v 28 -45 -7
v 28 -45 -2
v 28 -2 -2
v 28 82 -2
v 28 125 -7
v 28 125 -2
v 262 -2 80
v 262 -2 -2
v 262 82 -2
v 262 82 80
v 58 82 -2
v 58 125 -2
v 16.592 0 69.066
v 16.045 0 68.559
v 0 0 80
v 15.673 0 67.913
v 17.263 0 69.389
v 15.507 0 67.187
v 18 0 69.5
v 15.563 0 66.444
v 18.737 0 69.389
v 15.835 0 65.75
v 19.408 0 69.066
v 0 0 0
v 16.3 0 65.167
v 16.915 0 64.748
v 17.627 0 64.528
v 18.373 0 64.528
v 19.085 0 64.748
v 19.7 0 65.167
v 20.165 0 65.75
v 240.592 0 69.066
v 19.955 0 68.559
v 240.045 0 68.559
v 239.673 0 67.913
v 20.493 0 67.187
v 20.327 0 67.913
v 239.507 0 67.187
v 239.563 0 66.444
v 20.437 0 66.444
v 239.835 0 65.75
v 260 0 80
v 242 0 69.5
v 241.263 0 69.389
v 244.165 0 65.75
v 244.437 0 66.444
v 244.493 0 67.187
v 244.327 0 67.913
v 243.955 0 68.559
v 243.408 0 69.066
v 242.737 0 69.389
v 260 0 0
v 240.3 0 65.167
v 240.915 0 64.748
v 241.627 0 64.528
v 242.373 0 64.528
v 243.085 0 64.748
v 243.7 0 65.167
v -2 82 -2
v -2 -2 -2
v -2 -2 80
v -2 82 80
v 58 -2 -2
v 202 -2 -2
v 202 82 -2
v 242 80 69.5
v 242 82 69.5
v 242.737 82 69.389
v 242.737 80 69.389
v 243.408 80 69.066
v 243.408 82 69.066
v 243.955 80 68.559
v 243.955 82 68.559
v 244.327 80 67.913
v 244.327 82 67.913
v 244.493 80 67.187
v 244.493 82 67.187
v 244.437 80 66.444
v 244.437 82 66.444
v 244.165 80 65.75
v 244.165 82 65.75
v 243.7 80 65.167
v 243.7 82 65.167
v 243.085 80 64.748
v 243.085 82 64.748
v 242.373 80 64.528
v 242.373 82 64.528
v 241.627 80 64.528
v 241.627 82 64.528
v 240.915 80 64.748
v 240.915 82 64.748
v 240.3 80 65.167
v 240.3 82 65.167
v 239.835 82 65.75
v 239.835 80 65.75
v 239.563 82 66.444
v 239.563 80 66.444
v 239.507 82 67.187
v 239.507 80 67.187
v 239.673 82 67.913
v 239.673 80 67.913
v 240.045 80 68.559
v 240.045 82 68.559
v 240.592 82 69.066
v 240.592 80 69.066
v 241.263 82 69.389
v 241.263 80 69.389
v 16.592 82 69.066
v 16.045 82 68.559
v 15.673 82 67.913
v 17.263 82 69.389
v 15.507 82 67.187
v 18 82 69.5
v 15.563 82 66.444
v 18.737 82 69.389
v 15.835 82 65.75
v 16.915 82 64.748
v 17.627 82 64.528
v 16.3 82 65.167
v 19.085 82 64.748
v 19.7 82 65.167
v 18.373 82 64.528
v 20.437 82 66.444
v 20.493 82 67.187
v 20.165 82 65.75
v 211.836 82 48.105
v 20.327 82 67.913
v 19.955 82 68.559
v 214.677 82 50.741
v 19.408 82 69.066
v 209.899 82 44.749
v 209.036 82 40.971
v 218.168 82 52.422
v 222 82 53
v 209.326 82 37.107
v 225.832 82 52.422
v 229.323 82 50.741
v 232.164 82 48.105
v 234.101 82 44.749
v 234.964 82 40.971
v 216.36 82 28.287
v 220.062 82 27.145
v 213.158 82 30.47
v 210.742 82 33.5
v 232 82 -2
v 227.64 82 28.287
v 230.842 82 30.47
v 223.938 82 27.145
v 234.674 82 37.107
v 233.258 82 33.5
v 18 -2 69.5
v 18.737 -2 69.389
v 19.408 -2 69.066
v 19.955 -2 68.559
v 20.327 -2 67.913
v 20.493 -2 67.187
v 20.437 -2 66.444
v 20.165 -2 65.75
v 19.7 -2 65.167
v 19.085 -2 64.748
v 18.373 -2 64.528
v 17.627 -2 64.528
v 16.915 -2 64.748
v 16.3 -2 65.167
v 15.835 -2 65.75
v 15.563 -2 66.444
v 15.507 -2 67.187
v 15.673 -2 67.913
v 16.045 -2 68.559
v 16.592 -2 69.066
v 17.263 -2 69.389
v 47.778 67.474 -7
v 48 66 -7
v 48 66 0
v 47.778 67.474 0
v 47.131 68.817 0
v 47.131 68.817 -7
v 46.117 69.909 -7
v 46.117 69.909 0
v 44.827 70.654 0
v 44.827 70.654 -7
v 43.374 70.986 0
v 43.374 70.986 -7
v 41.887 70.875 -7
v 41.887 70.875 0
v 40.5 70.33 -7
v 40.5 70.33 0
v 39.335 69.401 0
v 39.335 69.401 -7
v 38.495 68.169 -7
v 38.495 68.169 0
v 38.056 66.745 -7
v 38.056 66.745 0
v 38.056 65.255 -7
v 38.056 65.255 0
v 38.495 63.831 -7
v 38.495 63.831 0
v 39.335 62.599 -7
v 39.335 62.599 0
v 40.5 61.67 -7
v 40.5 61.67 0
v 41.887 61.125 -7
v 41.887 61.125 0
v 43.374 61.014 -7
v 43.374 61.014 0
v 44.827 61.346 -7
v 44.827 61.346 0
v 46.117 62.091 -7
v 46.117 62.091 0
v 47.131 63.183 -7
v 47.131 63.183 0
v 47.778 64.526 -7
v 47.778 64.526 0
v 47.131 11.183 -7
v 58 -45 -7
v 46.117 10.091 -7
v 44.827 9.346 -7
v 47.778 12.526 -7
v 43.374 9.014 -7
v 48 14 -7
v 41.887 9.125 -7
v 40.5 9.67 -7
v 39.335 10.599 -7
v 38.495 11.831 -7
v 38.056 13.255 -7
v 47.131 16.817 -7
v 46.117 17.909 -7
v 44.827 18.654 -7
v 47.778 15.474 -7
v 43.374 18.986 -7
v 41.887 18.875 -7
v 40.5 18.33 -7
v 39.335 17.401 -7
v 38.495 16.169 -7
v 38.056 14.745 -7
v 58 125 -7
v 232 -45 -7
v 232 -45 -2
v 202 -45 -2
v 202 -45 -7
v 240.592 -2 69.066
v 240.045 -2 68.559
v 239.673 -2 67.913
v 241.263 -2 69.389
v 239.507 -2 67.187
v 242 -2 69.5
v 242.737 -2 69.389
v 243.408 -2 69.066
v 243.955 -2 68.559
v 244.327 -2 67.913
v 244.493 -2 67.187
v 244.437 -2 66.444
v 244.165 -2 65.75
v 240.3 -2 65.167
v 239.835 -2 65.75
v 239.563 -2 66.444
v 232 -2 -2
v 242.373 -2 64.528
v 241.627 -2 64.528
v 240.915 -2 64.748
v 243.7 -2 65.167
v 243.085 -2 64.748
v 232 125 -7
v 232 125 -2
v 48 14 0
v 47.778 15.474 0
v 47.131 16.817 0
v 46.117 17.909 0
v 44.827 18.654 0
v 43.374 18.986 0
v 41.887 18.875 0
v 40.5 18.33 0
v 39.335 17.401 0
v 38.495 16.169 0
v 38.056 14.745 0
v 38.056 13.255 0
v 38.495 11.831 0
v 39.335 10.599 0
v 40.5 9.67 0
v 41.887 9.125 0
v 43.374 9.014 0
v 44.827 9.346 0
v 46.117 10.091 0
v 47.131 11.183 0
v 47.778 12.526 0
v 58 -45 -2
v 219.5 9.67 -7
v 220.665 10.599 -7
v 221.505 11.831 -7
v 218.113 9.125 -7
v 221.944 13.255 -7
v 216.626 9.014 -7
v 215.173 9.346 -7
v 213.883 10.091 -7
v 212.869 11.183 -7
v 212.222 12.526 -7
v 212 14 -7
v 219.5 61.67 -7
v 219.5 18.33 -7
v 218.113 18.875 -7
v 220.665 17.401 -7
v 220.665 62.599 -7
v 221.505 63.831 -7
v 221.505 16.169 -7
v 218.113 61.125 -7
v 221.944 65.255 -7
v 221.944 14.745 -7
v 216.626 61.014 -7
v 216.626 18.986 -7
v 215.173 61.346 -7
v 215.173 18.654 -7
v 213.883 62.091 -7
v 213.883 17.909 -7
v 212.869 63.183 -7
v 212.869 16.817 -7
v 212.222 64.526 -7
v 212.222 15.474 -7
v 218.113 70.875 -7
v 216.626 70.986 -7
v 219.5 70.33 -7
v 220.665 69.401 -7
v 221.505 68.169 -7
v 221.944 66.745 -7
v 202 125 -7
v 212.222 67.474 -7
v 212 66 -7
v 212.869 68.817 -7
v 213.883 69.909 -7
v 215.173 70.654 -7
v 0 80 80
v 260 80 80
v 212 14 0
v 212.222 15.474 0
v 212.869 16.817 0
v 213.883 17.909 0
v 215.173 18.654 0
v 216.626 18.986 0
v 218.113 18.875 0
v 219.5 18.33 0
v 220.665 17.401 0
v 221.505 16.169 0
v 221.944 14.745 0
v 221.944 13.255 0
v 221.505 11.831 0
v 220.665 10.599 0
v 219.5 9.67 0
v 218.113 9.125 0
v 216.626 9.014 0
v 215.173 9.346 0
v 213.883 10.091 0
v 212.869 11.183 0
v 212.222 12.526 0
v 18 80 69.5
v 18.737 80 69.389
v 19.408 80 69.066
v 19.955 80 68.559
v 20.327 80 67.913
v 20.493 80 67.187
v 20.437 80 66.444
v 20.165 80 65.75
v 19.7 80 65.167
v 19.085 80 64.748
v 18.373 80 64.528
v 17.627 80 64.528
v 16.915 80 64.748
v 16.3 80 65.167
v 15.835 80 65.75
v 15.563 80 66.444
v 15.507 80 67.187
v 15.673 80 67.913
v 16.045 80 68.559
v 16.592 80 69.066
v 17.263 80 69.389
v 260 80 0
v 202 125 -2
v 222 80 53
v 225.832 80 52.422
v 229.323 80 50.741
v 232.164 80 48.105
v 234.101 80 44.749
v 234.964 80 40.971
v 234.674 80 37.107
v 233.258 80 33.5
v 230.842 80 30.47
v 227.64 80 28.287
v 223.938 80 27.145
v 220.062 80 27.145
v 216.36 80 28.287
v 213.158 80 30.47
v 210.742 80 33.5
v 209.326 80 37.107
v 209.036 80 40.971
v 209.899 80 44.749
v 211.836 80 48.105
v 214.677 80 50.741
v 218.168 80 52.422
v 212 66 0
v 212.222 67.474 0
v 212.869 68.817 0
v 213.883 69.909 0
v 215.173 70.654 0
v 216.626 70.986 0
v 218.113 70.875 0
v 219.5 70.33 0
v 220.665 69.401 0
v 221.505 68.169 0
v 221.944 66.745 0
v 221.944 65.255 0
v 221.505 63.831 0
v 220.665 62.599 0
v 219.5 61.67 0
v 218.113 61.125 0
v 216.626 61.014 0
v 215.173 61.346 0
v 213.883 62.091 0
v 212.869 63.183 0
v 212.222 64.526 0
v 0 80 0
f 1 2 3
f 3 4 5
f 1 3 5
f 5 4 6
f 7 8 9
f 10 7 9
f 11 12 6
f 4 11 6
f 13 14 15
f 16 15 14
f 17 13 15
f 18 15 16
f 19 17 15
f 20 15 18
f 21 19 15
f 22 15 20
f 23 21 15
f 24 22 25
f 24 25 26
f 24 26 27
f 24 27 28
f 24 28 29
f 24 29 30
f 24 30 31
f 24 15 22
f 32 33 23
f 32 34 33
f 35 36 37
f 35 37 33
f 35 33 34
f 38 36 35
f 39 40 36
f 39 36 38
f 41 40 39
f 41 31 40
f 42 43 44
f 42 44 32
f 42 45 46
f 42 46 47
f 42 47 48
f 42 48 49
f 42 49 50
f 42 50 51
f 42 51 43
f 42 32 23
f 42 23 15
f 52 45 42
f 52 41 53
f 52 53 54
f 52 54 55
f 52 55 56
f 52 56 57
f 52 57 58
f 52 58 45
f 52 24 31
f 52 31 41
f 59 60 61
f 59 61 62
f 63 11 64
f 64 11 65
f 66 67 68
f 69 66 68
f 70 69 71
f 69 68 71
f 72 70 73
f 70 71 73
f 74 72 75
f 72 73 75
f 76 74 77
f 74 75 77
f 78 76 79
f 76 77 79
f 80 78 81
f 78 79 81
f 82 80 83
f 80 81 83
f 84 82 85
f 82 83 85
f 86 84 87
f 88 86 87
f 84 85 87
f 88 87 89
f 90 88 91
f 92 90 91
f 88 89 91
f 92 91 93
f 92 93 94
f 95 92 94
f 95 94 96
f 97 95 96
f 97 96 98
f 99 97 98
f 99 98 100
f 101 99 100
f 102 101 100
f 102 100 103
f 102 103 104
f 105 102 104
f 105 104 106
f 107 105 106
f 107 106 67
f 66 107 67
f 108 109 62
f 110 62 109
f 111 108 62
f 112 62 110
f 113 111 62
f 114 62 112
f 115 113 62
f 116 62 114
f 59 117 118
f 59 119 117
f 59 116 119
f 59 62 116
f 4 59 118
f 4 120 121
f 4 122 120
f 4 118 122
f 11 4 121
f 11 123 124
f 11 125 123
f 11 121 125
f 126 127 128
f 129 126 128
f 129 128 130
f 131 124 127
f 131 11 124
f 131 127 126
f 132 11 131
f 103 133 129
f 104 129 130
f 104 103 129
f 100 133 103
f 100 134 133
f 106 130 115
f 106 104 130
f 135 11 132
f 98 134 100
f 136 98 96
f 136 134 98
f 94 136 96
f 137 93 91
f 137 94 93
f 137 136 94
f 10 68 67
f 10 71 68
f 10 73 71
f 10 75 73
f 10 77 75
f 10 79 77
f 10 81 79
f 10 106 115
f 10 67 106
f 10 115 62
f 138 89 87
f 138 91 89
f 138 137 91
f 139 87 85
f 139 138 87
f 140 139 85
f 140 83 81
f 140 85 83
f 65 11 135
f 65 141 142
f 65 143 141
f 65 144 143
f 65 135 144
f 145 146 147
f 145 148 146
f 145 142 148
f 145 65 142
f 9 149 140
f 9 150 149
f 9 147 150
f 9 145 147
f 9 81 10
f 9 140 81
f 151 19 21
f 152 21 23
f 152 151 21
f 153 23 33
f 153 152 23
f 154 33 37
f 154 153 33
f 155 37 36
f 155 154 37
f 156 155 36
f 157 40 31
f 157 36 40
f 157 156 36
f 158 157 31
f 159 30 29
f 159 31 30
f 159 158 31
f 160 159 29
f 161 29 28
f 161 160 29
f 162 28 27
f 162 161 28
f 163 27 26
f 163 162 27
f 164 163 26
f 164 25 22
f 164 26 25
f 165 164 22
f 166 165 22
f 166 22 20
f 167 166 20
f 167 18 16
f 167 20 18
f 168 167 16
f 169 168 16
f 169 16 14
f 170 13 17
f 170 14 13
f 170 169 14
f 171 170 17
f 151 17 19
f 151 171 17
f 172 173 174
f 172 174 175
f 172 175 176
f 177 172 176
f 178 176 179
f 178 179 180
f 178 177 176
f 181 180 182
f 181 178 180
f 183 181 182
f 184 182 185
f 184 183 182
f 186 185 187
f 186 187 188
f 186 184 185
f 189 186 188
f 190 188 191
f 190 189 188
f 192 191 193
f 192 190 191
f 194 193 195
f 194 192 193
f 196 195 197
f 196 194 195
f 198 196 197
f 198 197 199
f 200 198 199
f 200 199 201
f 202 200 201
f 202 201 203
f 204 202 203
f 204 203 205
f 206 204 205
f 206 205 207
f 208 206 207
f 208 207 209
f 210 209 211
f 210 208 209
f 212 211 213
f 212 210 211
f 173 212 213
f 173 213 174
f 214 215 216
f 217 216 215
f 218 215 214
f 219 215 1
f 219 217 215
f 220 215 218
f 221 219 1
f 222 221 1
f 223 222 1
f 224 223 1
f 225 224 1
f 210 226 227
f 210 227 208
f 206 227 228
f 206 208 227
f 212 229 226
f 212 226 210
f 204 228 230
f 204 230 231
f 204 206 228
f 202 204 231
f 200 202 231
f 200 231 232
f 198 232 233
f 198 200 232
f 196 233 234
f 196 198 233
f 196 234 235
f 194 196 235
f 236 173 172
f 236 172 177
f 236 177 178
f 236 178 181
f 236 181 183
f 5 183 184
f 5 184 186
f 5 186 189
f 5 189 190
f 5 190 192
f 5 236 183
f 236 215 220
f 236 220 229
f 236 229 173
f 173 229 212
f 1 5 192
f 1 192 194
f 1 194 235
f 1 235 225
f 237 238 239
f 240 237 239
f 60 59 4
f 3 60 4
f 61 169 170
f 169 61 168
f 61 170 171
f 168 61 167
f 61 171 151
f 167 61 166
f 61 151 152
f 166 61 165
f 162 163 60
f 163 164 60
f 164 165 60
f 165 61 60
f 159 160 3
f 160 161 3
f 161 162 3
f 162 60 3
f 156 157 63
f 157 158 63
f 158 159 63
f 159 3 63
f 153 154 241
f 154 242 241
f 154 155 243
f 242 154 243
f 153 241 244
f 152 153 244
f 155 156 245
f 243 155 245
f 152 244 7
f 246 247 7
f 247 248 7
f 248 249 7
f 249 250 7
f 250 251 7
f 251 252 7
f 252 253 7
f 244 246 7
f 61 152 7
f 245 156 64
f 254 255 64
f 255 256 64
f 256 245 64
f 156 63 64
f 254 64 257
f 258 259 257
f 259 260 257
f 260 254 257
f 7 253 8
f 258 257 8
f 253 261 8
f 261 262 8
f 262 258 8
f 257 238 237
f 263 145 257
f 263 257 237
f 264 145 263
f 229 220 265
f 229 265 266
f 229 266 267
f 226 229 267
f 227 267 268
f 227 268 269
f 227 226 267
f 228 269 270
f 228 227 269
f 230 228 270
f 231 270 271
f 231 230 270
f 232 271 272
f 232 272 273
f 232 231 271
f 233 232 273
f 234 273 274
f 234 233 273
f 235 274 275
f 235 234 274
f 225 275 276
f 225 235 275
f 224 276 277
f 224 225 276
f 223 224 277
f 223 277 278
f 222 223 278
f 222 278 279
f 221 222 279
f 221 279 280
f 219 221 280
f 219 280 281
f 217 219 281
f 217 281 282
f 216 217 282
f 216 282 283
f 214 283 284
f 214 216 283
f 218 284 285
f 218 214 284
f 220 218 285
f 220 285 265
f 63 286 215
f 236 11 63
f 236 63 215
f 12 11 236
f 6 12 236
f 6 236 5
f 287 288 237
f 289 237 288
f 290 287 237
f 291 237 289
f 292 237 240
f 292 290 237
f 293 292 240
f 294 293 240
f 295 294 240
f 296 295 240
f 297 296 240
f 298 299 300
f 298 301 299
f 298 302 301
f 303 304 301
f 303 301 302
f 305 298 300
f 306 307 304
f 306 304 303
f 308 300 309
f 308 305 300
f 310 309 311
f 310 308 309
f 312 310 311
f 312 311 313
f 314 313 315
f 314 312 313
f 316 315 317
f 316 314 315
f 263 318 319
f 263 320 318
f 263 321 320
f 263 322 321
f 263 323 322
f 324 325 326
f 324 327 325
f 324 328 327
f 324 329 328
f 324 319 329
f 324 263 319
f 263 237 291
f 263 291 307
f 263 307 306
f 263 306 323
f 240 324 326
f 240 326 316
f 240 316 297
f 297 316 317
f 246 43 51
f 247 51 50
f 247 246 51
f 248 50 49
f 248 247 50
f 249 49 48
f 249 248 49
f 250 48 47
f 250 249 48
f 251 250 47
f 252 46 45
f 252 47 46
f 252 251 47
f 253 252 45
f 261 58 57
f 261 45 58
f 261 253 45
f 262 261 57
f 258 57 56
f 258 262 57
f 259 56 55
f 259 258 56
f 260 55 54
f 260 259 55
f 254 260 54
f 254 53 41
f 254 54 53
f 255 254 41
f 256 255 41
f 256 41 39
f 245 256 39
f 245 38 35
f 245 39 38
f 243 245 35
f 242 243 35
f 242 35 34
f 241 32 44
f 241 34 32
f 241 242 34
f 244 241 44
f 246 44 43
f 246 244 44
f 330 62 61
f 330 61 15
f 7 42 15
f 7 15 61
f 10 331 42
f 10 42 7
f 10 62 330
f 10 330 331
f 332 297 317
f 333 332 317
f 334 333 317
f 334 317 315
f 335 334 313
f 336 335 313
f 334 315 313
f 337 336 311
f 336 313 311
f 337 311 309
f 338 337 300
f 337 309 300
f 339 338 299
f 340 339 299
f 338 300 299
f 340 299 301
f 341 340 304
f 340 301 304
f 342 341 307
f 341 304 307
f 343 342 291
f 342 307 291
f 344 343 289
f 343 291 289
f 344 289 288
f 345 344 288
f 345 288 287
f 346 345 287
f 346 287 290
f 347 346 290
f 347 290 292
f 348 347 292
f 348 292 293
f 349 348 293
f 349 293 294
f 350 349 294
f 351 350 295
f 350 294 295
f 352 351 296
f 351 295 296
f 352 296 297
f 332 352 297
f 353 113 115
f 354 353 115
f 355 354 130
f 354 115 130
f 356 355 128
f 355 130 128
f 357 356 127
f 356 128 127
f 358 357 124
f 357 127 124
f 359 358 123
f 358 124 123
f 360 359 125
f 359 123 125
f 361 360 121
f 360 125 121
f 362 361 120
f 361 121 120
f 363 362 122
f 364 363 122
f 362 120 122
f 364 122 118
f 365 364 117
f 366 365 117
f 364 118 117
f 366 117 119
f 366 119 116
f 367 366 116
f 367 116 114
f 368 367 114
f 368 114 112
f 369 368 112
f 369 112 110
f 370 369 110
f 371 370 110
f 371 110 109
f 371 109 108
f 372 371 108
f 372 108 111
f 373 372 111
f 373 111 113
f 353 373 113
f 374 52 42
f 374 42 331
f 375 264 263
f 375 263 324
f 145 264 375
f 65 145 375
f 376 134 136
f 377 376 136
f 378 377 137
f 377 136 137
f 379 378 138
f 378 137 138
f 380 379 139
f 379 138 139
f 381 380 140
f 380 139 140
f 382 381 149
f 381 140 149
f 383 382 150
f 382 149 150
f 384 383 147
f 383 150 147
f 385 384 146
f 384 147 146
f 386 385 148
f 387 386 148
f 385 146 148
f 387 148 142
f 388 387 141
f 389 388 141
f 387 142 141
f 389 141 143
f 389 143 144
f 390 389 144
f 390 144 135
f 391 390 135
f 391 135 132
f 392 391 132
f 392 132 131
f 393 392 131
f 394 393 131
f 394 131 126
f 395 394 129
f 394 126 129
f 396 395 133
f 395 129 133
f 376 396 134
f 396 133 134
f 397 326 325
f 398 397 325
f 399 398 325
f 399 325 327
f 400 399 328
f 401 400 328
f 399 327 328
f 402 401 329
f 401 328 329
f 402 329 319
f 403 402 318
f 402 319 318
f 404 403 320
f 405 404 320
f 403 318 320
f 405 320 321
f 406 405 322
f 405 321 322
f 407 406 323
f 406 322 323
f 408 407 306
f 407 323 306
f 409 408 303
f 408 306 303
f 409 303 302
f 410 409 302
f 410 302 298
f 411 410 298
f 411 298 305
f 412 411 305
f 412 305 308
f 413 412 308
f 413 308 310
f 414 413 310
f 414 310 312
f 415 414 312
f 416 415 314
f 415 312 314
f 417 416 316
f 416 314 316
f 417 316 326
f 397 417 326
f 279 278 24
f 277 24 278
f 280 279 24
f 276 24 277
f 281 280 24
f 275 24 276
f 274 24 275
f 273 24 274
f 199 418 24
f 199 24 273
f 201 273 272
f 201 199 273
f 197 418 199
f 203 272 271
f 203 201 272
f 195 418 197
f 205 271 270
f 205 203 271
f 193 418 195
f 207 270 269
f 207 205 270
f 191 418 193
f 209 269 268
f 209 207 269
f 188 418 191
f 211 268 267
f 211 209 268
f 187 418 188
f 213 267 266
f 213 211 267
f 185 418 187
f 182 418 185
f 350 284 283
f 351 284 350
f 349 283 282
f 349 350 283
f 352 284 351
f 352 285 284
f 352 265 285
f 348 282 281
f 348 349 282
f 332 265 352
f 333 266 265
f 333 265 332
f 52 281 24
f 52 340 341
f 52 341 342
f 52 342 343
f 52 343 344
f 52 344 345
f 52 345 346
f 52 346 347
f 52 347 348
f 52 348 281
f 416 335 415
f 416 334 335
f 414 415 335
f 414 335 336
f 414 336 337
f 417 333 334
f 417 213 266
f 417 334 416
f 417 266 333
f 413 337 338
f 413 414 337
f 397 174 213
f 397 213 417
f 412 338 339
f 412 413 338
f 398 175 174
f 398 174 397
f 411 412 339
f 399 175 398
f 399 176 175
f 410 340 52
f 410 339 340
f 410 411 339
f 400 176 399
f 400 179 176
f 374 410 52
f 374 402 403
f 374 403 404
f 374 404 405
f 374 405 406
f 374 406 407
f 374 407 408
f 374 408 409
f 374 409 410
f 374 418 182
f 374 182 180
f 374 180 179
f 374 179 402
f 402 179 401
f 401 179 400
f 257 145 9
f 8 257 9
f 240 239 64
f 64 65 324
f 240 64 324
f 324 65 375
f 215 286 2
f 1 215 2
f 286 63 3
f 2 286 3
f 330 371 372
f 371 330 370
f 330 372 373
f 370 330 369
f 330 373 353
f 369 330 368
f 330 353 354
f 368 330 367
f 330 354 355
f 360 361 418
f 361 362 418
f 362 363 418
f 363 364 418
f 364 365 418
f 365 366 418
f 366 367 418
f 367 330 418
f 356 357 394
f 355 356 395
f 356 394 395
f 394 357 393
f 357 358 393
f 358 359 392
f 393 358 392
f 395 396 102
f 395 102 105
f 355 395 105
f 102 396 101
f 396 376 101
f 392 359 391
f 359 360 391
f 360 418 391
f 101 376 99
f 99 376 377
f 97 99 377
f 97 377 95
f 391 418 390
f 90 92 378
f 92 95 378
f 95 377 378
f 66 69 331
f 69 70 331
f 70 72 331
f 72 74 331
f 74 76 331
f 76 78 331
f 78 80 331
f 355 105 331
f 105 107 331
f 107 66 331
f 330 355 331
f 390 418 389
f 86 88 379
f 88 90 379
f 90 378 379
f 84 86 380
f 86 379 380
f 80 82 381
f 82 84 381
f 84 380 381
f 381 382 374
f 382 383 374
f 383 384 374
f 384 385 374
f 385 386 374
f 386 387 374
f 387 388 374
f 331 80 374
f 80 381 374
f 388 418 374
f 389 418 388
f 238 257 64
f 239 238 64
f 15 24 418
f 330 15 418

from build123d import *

# Parameters (mm, degrees)
SKETCH1_W           = 260
SKETCH1_H           = 80
BOSS_EXTRUDE1_DEPTH = 80
SHELL1_T            = 2
SKETCH3_W           = 30
SKETCH3_H           = 170
BOSS_EXTRUDE2_DEPTH = 5
SKETCH4_R           = 5
CUT_EXTRUDE3_DEPTH  = 7
SKETCH6_R           = 13
CUT_EXTRUDE4_DEPTH  = 2
SKETCH7_R           = 2.5
CUT_EXTRUDE5_DEPTH  = 82


with BuildPart() as part:
    # Sketch1 → Boss-Extrude1 (new body)
    with BuildSketch(Plane.XY):
        with Locations((130, 40)):
            Rectangle(SKETCH1_W, SKETCH1_H)
    extrude(amount=BOSS_EXTRUDE1_DEPTH)

    # Shell1
    shell1_openings = [part.faces().sort_by_distance(p)[0] for p in [
        (130, 40, 80),
    ]]
    offset(amount=SHELL1_T, openings=shell1_openings, kind=Kind.INTERSECTION)

    # Sketch3 → Boss-Extrude2 (add)
    with BuildSketch(Plane(origin=(0, 0, -2), x_dir=(-1, 0, 0), z_dir=(0, 0, -1))):
        with Locations((-217, 40)):
            Rectangle(SKETCH3_W, SKETCH3_H)
        with Locations((-43, 40)):
            Rectangle(SKETCH3_W, SKETCH3_H)
    extrude(amount=BOSS_EXTRUDE2_DEPTH)

    # Sketch4 → Cut-Extrude3 (cut)
    with BuildSketch(Plane(origin=(0, 0, -7), x_dir=(-1, 0, 0), z_dir=(0, 0, -1))):
        with Locations((-217, 66)):
            Circle(SKETCH4_R)
        with Locations((-217, 14)):
            Circle(SKETCH4_R)
    cut_extrude3 = extrude(amount=-CUT_EXTRUDE3_DEPTH, mode=Mode.SUBTRACT)

    # Mirror1: Cut-Extrude3 across plane
    add(cut_extrude3.mirror(Plane(origin=(130, 0, 0), x_dir=(0, 0, 1), z_dir=(1, 0, 0))), mode=Mode.SUBTRACT)

    # Sketch6 → Cut-Extrude4 (cut)
    with BuildSketch(Plane(origin=(0, 82, 0), x_dir=(1, 0, 0), z_dir=(0, 1, 0))):
        with Locations(Location((222, -40, 0), (0, 0, 270))):
            Circle(SKETCH6_R)
    extrude(amount=-CUT_EXTRUDE4_DEPTH, mode=Mode.SUBTRACT)

    # Sketch7 → Cut-Extrude5 (cut)
    with BuildSketch(Plane(origin=(0, 82, 0), x_dir=(1, 0, 0), z_dir=(0, 1, 0))):
        with Locations(Location((18, -67, 0), (0, 0, 270))):
            Circle(SKETCH7_R)
        with Locations(Location((242, -67, 0), (0, 0, 270))):
            Circle(SKETCH7_R)
    cut_extrude5 = extrude(amount=-CUT_EXTRUDE5_DEPTH, mode=Mode.SUBTRACT)

    # Mirror2: Cut-Extrude5 across plane
    add(cut_extrude5.mirror(Plane(origin=(0, 40, 0), x_dir=(0, 0, 1), z_dir=(0, -1, 0))), mode=Mode.SUBTRACT)


solid = part.part
